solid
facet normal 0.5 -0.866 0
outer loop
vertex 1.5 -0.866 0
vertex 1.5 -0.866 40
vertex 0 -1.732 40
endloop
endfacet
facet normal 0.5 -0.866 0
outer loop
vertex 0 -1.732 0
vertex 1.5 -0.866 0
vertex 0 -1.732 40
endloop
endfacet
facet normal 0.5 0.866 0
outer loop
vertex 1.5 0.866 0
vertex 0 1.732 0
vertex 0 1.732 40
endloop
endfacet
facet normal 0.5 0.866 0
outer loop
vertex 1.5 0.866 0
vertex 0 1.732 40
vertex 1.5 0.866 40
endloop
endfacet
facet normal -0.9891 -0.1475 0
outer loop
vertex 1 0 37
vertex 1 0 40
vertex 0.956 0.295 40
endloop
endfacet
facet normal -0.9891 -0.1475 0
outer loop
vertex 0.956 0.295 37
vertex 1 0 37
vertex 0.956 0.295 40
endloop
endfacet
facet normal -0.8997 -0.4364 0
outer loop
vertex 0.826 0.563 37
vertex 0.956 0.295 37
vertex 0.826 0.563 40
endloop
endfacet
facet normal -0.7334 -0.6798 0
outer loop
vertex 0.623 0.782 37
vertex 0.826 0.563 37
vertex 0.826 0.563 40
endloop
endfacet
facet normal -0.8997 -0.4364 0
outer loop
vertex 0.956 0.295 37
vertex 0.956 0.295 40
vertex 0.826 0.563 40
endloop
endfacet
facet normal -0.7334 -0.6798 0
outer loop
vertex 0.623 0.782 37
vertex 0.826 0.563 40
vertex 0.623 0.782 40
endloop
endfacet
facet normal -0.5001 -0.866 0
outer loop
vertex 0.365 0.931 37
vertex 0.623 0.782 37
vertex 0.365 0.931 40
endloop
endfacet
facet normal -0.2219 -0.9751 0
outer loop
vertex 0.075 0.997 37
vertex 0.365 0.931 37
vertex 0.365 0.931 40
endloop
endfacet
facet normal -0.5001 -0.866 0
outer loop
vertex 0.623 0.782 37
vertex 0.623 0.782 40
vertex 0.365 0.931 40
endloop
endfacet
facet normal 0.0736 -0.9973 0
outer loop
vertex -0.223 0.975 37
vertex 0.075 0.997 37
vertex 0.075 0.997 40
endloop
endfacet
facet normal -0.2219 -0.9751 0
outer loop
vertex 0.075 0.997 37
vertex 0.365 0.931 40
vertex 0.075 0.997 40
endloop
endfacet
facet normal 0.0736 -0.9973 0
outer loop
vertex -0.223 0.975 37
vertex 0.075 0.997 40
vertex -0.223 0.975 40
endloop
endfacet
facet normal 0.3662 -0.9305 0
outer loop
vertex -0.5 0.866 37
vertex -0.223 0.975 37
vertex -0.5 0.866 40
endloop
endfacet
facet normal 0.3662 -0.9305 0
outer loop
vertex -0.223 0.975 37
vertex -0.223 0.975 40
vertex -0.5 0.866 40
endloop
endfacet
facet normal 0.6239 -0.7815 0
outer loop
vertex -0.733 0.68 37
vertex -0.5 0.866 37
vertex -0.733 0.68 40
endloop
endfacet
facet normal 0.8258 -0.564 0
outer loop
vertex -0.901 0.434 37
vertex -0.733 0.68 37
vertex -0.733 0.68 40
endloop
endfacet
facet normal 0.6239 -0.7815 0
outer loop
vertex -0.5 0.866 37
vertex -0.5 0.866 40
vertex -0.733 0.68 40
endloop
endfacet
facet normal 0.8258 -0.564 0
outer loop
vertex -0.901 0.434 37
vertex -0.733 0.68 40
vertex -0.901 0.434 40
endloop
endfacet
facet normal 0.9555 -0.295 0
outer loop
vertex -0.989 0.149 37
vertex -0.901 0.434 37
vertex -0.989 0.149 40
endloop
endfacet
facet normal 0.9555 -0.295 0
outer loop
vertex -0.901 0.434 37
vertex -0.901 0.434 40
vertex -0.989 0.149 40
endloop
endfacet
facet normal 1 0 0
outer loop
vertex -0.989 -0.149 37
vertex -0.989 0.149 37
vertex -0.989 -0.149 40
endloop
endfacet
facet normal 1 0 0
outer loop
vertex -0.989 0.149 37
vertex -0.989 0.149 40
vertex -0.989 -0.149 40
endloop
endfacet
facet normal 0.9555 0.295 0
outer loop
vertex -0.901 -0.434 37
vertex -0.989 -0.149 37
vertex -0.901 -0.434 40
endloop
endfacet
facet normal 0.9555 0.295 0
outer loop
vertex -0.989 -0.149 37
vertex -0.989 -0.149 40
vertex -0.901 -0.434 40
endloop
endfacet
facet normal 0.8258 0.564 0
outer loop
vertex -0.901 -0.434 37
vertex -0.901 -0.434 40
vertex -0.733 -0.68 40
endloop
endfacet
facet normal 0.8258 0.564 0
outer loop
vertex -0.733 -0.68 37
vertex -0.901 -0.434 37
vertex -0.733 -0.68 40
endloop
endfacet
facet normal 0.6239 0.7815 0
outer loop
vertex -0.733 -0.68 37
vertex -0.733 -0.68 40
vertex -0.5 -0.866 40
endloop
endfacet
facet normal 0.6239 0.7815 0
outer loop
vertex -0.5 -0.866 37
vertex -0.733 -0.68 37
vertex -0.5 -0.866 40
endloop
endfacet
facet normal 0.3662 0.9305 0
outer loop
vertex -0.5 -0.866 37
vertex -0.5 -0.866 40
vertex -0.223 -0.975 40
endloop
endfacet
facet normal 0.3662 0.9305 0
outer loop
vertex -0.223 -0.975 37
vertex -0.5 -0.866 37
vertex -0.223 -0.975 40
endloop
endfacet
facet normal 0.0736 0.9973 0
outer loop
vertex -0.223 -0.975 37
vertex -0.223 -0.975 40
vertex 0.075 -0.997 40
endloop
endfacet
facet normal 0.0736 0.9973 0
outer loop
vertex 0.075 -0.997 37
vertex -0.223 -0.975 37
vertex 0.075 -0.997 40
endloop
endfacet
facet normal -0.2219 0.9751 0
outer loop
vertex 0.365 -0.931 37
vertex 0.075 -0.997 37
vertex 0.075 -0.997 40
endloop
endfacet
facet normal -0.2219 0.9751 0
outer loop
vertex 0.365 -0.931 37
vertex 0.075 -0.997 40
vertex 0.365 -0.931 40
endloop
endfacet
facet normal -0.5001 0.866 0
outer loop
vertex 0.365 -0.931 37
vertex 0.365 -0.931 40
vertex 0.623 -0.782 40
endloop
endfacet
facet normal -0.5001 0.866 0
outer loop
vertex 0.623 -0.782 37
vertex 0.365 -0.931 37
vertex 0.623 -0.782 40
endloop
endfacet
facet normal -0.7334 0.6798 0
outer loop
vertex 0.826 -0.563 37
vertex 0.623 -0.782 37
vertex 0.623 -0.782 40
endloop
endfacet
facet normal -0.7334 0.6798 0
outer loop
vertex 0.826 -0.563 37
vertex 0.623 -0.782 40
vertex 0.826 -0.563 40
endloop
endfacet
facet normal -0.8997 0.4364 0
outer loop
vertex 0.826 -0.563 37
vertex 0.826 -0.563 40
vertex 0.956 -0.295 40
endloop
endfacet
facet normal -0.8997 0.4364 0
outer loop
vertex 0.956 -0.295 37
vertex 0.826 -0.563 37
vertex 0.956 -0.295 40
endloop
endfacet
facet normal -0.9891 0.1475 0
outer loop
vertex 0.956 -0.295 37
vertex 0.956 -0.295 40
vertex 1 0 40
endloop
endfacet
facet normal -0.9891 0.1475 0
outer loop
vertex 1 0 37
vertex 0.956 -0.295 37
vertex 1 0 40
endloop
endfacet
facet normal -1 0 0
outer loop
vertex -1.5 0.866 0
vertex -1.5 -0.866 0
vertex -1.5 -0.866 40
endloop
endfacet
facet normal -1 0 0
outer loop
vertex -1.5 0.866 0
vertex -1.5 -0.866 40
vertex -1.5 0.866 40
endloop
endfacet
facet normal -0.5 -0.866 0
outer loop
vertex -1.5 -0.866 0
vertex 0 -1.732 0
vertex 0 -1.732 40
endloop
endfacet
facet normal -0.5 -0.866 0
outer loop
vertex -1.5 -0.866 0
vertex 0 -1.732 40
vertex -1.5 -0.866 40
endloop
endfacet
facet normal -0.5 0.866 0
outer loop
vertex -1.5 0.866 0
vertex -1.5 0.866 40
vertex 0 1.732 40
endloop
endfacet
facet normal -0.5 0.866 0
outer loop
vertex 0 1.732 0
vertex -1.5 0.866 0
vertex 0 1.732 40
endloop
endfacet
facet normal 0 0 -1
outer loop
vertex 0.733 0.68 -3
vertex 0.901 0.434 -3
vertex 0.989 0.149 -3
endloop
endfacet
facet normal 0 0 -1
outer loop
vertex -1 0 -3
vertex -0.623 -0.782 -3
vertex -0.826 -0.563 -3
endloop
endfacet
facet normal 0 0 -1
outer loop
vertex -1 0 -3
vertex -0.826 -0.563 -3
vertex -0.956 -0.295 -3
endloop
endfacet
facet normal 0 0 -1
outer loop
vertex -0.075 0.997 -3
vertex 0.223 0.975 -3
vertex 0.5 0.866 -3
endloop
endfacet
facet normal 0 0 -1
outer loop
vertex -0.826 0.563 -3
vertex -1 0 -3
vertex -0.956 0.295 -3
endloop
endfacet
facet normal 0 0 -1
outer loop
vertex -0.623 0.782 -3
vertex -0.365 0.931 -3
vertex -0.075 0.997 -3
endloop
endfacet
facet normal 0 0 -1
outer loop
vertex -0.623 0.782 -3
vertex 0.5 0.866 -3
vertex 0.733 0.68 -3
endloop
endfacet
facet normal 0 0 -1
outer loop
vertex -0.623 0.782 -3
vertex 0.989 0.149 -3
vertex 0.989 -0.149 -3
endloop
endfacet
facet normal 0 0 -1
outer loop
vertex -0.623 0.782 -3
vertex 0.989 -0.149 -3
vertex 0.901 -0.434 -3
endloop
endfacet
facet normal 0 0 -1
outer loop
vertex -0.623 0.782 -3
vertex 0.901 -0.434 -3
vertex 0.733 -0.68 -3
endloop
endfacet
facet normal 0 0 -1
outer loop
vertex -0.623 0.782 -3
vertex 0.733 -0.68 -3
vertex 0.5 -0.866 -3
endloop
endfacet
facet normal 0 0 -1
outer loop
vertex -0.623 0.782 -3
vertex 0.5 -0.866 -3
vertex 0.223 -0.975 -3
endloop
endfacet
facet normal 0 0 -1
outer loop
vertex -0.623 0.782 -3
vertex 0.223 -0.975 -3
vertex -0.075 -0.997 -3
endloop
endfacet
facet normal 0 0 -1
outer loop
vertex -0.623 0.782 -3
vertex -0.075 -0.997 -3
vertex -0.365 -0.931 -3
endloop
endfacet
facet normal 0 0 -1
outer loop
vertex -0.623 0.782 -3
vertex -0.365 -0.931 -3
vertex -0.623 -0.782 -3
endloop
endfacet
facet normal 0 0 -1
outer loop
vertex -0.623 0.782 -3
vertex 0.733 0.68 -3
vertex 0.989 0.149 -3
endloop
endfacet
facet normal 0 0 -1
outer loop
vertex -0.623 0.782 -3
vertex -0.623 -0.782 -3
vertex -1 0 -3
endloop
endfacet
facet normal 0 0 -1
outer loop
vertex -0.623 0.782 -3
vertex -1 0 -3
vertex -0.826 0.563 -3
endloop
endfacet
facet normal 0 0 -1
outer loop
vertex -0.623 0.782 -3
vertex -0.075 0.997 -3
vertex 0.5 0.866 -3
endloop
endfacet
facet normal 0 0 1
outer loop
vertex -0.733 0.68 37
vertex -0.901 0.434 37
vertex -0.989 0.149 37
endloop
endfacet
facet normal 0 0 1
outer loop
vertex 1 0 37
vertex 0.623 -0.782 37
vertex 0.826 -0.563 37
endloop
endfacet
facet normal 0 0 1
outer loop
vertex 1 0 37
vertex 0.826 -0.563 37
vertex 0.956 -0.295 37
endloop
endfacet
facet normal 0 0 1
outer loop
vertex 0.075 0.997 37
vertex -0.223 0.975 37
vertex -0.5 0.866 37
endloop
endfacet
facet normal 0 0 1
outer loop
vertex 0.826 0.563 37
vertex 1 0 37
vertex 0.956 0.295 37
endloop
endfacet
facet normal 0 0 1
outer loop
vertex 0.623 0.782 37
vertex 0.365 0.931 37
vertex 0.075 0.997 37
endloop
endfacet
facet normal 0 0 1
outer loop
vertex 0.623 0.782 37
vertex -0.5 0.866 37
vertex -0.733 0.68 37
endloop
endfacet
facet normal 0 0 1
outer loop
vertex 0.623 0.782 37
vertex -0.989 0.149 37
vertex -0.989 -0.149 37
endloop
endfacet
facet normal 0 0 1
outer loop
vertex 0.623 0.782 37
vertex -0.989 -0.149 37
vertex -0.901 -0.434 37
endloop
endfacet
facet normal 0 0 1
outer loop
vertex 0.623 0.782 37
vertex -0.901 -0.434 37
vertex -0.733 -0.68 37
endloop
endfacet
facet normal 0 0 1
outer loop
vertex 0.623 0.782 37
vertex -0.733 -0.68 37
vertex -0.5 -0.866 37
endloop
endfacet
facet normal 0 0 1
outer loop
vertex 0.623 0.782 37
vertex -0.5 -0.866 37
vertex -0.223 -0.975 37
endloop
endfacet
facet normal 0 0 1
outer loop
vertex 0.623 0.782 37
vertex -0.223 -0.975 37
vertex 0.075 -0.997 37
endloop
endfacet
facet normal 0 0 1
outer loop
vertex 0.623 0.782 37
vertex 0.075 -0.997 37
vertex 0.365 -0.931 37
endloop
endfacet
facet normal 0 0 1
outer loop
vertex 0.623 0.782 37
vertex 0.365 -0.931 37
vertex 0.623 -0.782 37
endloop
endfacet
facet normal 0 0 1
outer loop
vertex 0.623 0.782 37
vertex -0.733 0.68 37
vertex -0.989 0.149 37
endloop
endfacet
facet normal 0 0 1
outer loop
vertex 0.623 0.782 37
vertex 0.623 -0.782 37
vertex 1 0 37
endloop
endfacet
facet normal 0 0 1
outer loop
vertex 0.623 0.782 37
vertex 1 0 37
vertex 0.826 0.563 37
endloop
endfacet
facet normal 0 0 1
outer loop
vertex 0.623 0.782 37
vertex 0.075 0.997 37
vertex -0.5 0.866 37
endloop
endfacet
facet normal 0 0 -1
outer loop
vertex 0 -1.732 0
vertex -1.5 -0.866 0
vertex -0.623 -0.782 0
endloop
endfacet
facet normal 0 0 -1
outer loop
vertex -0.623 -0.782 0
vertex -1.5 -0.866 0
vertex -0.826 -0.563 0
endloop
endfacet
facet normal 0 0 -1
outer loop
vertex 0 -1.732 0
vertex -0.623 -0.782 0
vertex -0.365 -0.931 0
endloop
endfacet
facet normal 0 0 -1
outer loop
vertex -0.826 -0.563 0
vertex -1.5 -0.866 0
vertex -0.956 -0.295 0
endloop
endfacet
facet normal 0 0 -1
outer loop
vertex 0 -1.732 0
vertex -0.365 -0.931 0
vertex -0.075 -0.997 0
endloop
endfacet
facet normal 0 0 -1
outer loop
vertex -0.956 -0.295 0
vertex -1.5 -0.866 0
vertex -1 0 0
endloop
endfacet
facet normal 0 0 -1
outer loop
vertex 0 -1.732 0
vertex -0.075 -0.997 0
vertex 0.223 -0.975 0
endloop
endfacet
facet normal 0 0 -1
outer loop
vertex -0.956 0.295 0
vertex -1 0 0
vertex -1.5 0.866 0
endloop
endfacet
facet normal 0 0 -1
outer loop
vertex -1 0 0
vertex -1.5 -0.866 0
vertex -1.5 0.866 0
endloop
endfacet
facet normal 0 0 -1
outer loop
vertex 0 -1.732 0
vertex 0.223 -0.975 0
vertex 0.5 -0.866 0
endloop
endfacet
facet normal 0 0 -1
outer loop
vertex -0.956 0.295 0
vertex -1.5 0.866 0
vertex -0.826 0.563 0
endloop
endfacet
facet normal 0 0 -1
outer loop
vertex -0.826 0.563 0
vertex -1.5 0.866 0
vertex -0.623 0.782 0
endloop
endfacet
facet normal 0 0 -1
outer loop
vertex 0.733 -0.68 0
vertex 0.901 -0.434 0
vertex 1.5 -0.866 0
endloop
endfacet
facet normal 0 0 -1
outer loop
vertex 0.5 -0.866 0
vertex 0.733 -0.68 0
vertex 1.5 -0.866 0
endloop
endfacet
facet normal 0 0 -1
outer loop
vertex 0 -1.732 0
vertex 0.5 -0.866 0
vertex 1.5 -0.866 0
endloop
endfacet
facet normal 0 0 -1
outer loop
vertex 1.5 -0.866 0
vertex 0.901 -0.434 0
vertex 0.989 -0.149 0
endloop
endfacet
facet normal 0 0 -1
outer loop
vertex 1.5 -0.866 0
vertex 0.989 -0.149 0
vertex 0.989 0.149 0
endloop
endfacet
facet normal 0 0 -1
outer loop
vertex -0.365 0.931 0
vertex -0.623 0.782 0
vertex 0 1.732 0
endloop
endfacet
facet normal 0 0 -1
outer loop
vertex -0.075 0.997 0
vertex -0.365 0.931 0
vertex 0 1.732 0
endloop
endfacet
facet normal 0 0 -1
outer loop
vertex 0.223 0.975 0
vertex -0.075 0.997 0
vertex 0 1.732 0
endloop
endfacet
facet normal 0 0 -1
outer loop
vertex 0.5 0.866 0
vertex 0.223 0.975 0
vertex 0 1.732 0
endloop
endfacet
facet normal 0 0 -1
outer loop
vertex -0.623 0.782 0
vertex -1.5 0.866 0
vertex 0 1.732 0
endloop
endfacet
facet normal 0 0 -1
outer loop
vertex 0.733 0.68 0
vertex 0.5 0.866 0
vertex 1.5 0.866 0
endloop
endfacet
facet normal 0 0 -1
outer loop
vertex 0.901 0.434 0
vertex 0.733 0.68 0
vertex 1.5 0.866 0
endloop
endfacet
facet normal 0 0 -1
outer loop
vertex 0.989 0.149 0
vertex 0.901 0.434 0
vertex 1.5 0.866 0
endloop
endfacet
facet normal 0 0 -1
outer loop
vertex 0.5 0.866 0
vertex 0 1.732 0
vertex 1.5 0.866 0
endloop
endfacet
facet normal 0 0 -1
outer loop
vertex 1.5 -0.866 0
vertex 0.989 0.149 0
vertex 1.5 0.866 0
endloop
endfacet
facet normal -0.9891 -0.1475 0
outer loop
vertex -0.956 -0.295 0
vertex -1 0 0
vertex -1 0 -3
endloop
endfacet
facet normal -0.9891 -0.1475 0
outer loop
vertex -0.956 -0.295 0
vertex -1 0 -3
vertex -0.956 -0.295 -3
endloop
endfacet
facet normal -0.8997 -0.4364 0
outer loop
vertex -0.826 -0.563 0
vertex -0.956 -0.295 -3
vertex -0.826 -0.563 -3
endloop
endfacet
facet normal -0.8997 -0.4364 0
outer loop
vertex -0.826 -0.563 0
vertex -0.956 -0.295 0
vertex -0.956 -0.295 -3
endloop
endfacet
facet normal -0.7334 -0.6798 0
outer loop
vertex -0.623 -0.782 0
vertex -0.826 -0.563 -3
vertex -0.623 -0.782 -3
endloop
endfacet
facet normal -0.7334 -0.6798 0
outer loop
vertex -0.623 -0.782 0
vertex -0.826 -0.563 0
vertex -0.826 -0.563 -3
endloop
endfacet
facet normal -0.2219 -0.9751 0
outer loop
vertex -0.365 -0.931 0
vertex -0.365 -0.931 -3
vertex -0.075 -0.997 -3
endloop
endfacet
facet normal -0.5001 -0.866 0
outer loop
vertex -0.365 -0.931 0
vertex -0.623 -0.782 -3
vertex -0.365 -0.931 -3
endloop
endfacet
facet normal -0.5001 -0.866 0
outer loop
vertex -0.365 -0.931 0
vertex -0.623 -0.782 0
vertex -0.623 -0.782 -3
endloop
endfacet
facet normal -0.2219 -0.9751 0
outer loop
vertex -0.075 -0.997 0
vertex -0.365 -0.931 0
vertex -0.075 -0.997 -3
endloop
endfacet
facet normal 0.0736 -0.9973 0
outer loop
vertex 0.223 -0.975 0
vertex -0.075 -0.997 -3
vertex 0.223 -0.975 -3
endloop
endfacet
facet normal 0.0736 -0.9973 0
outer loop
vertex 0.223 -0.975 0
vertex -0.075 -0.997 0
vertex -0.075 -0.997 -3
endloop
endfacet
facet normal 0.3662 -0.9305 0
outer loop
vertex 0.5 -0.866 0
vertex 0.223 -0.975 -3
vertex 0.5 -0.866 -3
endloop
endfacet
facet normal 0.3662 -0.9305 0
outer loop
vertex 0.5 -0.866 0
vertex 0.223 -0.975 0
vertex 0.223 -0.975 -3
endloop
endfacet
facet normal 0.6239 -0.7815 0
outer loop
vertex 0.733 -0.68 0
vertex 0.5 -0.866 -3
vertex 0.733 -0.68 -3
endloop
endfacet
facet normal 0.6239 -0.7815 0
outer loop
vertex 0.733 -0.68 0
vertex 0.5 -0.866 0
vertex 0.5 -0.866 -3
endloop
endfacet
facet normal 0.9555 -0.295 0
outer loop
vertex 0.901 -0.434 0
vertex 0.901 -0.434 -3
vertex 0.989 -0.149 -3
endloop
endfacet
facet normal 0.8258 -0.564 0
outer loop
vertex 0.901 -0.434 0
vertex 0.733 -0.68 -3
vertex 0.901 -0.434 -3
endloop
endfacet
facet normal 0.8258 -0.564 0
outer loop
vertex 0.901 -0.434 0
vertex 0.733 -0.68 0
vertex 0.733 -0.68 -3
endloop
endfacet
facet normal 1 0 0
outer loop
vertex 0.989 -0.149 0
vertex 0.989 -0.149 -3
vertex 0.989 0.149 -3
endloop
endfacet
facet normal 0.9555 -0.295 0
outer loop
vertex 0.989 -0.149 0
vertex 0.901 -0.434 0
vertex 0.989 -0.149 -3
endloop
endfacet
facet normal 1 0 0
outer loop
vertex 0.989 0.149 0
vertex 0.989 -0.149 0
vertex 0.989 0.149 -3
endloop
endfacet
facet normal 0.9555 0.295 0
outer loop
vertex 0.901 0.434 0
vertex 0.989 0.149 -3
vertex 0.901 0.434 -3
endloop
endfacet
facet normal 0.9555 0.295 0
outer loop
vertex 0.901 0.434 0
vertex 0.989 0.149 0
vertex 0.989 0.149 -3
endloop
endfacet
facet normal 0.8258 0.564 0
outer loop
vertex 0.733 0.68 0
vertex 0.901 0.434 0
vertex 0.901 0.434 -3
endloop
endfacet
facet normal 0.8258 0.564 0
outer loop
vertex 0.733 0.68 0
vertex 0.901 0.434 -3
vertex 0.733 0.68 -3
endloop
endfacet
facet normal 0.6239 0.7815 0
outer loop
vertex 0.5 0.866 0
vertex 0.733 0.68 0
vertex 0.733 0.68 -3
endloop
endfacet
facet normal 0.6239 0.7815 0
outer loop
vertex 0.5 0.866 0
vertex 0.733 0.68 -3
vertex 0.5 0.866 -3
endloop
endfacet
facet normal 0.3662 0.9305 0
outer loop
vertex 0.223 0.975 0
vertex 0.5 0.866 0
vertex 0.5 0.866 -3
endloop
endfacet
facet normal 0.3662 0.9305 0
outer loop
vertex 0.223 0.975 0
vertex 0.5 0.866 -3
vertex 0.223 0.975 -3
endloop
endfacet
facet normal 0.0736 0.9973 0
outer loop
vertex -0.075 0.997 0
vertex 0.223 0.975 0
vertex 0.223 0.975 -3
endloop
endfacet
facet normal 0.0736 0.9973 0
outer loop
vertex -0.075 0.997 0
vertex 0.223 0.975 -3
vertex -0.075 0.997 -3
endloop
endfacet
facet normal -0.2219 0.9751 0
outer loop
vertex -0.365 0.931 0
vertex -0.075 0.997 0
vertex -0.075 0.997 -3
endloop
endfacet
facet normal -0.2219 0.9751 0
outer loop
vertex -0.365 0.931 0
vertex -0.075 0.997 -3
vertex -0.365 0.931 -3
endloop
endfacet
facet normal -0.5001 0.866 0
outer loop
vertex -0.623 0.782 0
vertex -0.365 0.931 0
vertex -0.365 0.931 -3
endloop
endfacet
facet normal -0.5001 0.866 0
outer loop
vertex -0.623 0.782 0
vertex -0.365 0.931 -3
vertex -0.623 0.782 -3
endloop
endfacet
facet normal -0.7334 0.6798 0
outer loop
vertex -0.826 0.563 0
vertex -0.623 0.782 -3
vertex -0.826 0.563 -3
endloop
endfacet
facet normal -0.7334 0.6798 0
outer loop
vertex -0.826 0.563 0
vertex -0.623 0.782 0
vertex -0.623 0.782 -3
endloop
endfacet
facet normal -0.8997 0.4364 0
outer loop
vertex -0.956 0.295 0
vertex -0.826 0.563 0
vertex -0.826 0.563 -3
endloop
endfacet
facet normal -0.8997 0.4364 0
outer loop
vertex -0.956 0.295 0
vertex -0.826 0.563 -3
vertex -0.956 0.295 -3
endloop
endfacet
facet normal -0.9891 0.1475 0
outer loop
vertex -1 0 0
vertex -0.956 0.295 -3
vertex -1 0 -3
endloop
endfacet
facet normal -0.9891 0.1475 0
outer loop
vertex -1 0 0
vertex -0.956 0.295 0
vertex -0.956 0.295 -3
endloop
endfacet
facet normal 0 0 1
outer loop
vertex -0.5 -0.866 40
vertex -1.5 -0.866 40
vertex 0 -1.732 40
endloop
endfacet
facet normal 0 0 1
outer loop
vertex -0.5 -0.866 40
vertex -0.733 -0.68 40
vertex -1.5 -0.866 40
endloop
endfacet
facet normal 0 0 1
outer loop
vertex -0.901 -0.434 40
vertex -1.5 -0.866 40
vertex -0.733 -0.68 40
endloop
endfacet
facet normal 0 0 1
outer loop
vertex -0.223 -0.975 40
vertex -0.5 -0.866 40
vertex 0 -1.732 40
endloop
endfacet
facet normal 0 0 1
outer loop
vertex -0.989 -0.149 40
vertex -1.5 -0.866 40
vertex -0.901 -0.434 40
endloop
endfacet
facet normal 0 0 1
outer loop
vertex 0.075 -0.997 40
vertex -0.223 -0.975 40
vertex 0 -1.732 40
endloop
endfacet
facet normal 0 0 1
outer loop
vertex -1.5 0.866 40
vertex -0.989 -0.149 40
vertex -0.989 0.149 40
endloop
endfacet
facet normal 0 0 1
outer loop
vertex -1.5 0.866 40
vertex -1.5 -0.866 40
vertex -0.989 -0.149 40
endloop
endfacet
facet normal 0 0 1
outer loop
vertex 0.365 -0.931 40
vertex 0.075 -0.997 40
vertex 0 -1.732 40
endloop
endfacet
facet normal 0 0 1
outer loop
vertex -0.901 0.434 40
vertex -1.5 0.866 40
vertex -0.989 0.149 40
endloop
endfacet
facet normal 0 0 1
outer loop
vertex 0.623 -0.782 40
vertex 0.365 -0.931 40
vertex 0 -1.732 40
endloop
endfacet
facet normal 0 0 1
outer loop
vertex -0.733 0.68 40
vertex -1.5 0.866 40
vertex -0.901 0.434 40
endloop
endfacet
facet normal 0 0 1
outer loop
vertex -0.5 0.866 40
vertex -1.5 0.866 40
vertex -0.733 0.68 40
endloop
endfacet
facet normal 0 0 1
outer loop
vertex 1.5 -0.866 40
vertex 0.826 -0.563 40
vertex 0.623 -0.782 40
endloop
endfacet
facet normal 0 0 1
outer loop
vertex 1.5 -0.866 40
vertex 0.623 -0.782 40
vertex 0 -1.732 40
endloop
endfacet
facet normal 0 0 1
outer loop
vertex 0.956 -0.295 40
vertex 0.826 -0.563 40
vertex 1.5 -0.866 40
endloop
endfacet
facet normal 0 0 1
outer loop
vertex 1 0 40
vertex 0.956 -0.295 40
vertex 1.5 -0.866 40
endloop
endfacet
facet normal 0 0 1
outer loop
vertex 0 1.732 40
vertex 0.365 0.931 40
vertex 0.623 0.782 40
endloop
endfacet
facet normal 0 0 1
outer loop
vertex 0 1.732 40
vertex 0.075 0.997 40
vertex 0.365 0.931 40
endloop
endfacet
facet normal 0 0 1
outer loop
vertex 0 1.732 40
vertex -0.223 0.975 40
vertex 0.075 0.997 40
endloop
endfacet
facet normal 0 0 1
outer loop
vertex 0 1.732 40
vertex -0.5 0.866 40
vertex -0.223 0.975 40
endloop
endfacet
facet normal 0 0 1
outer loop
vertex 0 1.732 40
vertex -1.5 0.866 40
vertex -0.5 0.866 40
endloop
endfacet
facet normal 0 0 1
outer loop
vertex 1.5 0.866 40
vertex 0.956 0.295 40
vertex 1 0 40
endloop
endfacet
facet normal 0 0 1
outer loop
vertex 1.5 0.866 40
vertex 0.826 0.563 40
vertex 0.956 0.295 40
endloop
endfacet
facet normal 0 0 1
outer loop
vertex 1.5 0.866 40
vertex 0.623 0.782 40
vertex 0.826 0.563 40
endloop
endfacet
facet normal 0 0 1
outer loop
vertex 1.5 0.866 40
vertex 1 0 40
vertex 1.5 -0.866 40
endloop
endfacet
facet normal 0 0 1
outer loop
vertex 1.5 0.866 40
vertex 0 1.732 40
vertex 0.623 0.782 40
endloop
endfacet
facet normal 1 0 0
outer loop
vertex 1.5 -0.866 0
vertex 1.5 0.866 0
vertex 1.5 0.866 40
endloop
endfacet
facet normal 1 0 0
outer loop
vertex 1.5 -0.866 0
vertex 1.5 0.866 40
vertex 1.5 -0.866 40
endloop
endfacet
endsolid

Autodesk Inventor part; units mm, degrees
ref_plane "YZ Plane" through (0, 0, 0) normal (1, 0, 0) x (0, 1, 0)
ref_plane "XZ Plane" through (0, 0, 0) normal (0, 1, 0) x (-1, 0, 0)
ref_plane "XY Plane" through (0, 0, 0) normal (0, 0, 1) x (1, 0, 0)
sketch "Sketch1" plane through (0, 0, 0) normal (0, 0, 1) x (1, 0, 0)
  line L0 (0, 1.7321) -> (1.5, 0.866)
  line L1 (1.5, 0.866) -> (1.5, -0.866)
  line L2 (1.5, -0.866) -> (0, -1.7321)
  line L3 (0, -1.7321) -> (-1.5, -0.866)
  line L4 (-1.5, -0.866) -> (-1.5, 0.866)
  line L5 (-1.5, 0.866) -> (0, 1.7321)
  point P0 (0, 0)
  point P1 (0, 0)
  dimension "d0" = 3
extrude "Extrusion1" add sketch "Sketch1" along normal blind 40
sketch "Sketch2" plane through (0, 0, 40) normal (0, 0, 1) x (1, 0, 0)
  circle A0 centre (0, 0) radius 1
  dimension "d3" = 2
extrude "Extrusion2" cut sketch "Sketch2" against normal blind 3
sketch "Sketch3" plane through (0, 0, 0) normal (0, 0, -1) x (-1, 0, 0)
  circle A0 centre (0, 0) radius 1
extrude "Extrusion3" add sketch "Sketch3" along normal blind 3
thread "Thread1" size "M2x0.4" class "6g" standard "ANSI Metric M Profile" length 12.7
thread "Thread2" size "M2x0.4" class "6H" standard "ANSI Metric M Profile" length 12.7
properties part number "M2_40mm_standoff"
